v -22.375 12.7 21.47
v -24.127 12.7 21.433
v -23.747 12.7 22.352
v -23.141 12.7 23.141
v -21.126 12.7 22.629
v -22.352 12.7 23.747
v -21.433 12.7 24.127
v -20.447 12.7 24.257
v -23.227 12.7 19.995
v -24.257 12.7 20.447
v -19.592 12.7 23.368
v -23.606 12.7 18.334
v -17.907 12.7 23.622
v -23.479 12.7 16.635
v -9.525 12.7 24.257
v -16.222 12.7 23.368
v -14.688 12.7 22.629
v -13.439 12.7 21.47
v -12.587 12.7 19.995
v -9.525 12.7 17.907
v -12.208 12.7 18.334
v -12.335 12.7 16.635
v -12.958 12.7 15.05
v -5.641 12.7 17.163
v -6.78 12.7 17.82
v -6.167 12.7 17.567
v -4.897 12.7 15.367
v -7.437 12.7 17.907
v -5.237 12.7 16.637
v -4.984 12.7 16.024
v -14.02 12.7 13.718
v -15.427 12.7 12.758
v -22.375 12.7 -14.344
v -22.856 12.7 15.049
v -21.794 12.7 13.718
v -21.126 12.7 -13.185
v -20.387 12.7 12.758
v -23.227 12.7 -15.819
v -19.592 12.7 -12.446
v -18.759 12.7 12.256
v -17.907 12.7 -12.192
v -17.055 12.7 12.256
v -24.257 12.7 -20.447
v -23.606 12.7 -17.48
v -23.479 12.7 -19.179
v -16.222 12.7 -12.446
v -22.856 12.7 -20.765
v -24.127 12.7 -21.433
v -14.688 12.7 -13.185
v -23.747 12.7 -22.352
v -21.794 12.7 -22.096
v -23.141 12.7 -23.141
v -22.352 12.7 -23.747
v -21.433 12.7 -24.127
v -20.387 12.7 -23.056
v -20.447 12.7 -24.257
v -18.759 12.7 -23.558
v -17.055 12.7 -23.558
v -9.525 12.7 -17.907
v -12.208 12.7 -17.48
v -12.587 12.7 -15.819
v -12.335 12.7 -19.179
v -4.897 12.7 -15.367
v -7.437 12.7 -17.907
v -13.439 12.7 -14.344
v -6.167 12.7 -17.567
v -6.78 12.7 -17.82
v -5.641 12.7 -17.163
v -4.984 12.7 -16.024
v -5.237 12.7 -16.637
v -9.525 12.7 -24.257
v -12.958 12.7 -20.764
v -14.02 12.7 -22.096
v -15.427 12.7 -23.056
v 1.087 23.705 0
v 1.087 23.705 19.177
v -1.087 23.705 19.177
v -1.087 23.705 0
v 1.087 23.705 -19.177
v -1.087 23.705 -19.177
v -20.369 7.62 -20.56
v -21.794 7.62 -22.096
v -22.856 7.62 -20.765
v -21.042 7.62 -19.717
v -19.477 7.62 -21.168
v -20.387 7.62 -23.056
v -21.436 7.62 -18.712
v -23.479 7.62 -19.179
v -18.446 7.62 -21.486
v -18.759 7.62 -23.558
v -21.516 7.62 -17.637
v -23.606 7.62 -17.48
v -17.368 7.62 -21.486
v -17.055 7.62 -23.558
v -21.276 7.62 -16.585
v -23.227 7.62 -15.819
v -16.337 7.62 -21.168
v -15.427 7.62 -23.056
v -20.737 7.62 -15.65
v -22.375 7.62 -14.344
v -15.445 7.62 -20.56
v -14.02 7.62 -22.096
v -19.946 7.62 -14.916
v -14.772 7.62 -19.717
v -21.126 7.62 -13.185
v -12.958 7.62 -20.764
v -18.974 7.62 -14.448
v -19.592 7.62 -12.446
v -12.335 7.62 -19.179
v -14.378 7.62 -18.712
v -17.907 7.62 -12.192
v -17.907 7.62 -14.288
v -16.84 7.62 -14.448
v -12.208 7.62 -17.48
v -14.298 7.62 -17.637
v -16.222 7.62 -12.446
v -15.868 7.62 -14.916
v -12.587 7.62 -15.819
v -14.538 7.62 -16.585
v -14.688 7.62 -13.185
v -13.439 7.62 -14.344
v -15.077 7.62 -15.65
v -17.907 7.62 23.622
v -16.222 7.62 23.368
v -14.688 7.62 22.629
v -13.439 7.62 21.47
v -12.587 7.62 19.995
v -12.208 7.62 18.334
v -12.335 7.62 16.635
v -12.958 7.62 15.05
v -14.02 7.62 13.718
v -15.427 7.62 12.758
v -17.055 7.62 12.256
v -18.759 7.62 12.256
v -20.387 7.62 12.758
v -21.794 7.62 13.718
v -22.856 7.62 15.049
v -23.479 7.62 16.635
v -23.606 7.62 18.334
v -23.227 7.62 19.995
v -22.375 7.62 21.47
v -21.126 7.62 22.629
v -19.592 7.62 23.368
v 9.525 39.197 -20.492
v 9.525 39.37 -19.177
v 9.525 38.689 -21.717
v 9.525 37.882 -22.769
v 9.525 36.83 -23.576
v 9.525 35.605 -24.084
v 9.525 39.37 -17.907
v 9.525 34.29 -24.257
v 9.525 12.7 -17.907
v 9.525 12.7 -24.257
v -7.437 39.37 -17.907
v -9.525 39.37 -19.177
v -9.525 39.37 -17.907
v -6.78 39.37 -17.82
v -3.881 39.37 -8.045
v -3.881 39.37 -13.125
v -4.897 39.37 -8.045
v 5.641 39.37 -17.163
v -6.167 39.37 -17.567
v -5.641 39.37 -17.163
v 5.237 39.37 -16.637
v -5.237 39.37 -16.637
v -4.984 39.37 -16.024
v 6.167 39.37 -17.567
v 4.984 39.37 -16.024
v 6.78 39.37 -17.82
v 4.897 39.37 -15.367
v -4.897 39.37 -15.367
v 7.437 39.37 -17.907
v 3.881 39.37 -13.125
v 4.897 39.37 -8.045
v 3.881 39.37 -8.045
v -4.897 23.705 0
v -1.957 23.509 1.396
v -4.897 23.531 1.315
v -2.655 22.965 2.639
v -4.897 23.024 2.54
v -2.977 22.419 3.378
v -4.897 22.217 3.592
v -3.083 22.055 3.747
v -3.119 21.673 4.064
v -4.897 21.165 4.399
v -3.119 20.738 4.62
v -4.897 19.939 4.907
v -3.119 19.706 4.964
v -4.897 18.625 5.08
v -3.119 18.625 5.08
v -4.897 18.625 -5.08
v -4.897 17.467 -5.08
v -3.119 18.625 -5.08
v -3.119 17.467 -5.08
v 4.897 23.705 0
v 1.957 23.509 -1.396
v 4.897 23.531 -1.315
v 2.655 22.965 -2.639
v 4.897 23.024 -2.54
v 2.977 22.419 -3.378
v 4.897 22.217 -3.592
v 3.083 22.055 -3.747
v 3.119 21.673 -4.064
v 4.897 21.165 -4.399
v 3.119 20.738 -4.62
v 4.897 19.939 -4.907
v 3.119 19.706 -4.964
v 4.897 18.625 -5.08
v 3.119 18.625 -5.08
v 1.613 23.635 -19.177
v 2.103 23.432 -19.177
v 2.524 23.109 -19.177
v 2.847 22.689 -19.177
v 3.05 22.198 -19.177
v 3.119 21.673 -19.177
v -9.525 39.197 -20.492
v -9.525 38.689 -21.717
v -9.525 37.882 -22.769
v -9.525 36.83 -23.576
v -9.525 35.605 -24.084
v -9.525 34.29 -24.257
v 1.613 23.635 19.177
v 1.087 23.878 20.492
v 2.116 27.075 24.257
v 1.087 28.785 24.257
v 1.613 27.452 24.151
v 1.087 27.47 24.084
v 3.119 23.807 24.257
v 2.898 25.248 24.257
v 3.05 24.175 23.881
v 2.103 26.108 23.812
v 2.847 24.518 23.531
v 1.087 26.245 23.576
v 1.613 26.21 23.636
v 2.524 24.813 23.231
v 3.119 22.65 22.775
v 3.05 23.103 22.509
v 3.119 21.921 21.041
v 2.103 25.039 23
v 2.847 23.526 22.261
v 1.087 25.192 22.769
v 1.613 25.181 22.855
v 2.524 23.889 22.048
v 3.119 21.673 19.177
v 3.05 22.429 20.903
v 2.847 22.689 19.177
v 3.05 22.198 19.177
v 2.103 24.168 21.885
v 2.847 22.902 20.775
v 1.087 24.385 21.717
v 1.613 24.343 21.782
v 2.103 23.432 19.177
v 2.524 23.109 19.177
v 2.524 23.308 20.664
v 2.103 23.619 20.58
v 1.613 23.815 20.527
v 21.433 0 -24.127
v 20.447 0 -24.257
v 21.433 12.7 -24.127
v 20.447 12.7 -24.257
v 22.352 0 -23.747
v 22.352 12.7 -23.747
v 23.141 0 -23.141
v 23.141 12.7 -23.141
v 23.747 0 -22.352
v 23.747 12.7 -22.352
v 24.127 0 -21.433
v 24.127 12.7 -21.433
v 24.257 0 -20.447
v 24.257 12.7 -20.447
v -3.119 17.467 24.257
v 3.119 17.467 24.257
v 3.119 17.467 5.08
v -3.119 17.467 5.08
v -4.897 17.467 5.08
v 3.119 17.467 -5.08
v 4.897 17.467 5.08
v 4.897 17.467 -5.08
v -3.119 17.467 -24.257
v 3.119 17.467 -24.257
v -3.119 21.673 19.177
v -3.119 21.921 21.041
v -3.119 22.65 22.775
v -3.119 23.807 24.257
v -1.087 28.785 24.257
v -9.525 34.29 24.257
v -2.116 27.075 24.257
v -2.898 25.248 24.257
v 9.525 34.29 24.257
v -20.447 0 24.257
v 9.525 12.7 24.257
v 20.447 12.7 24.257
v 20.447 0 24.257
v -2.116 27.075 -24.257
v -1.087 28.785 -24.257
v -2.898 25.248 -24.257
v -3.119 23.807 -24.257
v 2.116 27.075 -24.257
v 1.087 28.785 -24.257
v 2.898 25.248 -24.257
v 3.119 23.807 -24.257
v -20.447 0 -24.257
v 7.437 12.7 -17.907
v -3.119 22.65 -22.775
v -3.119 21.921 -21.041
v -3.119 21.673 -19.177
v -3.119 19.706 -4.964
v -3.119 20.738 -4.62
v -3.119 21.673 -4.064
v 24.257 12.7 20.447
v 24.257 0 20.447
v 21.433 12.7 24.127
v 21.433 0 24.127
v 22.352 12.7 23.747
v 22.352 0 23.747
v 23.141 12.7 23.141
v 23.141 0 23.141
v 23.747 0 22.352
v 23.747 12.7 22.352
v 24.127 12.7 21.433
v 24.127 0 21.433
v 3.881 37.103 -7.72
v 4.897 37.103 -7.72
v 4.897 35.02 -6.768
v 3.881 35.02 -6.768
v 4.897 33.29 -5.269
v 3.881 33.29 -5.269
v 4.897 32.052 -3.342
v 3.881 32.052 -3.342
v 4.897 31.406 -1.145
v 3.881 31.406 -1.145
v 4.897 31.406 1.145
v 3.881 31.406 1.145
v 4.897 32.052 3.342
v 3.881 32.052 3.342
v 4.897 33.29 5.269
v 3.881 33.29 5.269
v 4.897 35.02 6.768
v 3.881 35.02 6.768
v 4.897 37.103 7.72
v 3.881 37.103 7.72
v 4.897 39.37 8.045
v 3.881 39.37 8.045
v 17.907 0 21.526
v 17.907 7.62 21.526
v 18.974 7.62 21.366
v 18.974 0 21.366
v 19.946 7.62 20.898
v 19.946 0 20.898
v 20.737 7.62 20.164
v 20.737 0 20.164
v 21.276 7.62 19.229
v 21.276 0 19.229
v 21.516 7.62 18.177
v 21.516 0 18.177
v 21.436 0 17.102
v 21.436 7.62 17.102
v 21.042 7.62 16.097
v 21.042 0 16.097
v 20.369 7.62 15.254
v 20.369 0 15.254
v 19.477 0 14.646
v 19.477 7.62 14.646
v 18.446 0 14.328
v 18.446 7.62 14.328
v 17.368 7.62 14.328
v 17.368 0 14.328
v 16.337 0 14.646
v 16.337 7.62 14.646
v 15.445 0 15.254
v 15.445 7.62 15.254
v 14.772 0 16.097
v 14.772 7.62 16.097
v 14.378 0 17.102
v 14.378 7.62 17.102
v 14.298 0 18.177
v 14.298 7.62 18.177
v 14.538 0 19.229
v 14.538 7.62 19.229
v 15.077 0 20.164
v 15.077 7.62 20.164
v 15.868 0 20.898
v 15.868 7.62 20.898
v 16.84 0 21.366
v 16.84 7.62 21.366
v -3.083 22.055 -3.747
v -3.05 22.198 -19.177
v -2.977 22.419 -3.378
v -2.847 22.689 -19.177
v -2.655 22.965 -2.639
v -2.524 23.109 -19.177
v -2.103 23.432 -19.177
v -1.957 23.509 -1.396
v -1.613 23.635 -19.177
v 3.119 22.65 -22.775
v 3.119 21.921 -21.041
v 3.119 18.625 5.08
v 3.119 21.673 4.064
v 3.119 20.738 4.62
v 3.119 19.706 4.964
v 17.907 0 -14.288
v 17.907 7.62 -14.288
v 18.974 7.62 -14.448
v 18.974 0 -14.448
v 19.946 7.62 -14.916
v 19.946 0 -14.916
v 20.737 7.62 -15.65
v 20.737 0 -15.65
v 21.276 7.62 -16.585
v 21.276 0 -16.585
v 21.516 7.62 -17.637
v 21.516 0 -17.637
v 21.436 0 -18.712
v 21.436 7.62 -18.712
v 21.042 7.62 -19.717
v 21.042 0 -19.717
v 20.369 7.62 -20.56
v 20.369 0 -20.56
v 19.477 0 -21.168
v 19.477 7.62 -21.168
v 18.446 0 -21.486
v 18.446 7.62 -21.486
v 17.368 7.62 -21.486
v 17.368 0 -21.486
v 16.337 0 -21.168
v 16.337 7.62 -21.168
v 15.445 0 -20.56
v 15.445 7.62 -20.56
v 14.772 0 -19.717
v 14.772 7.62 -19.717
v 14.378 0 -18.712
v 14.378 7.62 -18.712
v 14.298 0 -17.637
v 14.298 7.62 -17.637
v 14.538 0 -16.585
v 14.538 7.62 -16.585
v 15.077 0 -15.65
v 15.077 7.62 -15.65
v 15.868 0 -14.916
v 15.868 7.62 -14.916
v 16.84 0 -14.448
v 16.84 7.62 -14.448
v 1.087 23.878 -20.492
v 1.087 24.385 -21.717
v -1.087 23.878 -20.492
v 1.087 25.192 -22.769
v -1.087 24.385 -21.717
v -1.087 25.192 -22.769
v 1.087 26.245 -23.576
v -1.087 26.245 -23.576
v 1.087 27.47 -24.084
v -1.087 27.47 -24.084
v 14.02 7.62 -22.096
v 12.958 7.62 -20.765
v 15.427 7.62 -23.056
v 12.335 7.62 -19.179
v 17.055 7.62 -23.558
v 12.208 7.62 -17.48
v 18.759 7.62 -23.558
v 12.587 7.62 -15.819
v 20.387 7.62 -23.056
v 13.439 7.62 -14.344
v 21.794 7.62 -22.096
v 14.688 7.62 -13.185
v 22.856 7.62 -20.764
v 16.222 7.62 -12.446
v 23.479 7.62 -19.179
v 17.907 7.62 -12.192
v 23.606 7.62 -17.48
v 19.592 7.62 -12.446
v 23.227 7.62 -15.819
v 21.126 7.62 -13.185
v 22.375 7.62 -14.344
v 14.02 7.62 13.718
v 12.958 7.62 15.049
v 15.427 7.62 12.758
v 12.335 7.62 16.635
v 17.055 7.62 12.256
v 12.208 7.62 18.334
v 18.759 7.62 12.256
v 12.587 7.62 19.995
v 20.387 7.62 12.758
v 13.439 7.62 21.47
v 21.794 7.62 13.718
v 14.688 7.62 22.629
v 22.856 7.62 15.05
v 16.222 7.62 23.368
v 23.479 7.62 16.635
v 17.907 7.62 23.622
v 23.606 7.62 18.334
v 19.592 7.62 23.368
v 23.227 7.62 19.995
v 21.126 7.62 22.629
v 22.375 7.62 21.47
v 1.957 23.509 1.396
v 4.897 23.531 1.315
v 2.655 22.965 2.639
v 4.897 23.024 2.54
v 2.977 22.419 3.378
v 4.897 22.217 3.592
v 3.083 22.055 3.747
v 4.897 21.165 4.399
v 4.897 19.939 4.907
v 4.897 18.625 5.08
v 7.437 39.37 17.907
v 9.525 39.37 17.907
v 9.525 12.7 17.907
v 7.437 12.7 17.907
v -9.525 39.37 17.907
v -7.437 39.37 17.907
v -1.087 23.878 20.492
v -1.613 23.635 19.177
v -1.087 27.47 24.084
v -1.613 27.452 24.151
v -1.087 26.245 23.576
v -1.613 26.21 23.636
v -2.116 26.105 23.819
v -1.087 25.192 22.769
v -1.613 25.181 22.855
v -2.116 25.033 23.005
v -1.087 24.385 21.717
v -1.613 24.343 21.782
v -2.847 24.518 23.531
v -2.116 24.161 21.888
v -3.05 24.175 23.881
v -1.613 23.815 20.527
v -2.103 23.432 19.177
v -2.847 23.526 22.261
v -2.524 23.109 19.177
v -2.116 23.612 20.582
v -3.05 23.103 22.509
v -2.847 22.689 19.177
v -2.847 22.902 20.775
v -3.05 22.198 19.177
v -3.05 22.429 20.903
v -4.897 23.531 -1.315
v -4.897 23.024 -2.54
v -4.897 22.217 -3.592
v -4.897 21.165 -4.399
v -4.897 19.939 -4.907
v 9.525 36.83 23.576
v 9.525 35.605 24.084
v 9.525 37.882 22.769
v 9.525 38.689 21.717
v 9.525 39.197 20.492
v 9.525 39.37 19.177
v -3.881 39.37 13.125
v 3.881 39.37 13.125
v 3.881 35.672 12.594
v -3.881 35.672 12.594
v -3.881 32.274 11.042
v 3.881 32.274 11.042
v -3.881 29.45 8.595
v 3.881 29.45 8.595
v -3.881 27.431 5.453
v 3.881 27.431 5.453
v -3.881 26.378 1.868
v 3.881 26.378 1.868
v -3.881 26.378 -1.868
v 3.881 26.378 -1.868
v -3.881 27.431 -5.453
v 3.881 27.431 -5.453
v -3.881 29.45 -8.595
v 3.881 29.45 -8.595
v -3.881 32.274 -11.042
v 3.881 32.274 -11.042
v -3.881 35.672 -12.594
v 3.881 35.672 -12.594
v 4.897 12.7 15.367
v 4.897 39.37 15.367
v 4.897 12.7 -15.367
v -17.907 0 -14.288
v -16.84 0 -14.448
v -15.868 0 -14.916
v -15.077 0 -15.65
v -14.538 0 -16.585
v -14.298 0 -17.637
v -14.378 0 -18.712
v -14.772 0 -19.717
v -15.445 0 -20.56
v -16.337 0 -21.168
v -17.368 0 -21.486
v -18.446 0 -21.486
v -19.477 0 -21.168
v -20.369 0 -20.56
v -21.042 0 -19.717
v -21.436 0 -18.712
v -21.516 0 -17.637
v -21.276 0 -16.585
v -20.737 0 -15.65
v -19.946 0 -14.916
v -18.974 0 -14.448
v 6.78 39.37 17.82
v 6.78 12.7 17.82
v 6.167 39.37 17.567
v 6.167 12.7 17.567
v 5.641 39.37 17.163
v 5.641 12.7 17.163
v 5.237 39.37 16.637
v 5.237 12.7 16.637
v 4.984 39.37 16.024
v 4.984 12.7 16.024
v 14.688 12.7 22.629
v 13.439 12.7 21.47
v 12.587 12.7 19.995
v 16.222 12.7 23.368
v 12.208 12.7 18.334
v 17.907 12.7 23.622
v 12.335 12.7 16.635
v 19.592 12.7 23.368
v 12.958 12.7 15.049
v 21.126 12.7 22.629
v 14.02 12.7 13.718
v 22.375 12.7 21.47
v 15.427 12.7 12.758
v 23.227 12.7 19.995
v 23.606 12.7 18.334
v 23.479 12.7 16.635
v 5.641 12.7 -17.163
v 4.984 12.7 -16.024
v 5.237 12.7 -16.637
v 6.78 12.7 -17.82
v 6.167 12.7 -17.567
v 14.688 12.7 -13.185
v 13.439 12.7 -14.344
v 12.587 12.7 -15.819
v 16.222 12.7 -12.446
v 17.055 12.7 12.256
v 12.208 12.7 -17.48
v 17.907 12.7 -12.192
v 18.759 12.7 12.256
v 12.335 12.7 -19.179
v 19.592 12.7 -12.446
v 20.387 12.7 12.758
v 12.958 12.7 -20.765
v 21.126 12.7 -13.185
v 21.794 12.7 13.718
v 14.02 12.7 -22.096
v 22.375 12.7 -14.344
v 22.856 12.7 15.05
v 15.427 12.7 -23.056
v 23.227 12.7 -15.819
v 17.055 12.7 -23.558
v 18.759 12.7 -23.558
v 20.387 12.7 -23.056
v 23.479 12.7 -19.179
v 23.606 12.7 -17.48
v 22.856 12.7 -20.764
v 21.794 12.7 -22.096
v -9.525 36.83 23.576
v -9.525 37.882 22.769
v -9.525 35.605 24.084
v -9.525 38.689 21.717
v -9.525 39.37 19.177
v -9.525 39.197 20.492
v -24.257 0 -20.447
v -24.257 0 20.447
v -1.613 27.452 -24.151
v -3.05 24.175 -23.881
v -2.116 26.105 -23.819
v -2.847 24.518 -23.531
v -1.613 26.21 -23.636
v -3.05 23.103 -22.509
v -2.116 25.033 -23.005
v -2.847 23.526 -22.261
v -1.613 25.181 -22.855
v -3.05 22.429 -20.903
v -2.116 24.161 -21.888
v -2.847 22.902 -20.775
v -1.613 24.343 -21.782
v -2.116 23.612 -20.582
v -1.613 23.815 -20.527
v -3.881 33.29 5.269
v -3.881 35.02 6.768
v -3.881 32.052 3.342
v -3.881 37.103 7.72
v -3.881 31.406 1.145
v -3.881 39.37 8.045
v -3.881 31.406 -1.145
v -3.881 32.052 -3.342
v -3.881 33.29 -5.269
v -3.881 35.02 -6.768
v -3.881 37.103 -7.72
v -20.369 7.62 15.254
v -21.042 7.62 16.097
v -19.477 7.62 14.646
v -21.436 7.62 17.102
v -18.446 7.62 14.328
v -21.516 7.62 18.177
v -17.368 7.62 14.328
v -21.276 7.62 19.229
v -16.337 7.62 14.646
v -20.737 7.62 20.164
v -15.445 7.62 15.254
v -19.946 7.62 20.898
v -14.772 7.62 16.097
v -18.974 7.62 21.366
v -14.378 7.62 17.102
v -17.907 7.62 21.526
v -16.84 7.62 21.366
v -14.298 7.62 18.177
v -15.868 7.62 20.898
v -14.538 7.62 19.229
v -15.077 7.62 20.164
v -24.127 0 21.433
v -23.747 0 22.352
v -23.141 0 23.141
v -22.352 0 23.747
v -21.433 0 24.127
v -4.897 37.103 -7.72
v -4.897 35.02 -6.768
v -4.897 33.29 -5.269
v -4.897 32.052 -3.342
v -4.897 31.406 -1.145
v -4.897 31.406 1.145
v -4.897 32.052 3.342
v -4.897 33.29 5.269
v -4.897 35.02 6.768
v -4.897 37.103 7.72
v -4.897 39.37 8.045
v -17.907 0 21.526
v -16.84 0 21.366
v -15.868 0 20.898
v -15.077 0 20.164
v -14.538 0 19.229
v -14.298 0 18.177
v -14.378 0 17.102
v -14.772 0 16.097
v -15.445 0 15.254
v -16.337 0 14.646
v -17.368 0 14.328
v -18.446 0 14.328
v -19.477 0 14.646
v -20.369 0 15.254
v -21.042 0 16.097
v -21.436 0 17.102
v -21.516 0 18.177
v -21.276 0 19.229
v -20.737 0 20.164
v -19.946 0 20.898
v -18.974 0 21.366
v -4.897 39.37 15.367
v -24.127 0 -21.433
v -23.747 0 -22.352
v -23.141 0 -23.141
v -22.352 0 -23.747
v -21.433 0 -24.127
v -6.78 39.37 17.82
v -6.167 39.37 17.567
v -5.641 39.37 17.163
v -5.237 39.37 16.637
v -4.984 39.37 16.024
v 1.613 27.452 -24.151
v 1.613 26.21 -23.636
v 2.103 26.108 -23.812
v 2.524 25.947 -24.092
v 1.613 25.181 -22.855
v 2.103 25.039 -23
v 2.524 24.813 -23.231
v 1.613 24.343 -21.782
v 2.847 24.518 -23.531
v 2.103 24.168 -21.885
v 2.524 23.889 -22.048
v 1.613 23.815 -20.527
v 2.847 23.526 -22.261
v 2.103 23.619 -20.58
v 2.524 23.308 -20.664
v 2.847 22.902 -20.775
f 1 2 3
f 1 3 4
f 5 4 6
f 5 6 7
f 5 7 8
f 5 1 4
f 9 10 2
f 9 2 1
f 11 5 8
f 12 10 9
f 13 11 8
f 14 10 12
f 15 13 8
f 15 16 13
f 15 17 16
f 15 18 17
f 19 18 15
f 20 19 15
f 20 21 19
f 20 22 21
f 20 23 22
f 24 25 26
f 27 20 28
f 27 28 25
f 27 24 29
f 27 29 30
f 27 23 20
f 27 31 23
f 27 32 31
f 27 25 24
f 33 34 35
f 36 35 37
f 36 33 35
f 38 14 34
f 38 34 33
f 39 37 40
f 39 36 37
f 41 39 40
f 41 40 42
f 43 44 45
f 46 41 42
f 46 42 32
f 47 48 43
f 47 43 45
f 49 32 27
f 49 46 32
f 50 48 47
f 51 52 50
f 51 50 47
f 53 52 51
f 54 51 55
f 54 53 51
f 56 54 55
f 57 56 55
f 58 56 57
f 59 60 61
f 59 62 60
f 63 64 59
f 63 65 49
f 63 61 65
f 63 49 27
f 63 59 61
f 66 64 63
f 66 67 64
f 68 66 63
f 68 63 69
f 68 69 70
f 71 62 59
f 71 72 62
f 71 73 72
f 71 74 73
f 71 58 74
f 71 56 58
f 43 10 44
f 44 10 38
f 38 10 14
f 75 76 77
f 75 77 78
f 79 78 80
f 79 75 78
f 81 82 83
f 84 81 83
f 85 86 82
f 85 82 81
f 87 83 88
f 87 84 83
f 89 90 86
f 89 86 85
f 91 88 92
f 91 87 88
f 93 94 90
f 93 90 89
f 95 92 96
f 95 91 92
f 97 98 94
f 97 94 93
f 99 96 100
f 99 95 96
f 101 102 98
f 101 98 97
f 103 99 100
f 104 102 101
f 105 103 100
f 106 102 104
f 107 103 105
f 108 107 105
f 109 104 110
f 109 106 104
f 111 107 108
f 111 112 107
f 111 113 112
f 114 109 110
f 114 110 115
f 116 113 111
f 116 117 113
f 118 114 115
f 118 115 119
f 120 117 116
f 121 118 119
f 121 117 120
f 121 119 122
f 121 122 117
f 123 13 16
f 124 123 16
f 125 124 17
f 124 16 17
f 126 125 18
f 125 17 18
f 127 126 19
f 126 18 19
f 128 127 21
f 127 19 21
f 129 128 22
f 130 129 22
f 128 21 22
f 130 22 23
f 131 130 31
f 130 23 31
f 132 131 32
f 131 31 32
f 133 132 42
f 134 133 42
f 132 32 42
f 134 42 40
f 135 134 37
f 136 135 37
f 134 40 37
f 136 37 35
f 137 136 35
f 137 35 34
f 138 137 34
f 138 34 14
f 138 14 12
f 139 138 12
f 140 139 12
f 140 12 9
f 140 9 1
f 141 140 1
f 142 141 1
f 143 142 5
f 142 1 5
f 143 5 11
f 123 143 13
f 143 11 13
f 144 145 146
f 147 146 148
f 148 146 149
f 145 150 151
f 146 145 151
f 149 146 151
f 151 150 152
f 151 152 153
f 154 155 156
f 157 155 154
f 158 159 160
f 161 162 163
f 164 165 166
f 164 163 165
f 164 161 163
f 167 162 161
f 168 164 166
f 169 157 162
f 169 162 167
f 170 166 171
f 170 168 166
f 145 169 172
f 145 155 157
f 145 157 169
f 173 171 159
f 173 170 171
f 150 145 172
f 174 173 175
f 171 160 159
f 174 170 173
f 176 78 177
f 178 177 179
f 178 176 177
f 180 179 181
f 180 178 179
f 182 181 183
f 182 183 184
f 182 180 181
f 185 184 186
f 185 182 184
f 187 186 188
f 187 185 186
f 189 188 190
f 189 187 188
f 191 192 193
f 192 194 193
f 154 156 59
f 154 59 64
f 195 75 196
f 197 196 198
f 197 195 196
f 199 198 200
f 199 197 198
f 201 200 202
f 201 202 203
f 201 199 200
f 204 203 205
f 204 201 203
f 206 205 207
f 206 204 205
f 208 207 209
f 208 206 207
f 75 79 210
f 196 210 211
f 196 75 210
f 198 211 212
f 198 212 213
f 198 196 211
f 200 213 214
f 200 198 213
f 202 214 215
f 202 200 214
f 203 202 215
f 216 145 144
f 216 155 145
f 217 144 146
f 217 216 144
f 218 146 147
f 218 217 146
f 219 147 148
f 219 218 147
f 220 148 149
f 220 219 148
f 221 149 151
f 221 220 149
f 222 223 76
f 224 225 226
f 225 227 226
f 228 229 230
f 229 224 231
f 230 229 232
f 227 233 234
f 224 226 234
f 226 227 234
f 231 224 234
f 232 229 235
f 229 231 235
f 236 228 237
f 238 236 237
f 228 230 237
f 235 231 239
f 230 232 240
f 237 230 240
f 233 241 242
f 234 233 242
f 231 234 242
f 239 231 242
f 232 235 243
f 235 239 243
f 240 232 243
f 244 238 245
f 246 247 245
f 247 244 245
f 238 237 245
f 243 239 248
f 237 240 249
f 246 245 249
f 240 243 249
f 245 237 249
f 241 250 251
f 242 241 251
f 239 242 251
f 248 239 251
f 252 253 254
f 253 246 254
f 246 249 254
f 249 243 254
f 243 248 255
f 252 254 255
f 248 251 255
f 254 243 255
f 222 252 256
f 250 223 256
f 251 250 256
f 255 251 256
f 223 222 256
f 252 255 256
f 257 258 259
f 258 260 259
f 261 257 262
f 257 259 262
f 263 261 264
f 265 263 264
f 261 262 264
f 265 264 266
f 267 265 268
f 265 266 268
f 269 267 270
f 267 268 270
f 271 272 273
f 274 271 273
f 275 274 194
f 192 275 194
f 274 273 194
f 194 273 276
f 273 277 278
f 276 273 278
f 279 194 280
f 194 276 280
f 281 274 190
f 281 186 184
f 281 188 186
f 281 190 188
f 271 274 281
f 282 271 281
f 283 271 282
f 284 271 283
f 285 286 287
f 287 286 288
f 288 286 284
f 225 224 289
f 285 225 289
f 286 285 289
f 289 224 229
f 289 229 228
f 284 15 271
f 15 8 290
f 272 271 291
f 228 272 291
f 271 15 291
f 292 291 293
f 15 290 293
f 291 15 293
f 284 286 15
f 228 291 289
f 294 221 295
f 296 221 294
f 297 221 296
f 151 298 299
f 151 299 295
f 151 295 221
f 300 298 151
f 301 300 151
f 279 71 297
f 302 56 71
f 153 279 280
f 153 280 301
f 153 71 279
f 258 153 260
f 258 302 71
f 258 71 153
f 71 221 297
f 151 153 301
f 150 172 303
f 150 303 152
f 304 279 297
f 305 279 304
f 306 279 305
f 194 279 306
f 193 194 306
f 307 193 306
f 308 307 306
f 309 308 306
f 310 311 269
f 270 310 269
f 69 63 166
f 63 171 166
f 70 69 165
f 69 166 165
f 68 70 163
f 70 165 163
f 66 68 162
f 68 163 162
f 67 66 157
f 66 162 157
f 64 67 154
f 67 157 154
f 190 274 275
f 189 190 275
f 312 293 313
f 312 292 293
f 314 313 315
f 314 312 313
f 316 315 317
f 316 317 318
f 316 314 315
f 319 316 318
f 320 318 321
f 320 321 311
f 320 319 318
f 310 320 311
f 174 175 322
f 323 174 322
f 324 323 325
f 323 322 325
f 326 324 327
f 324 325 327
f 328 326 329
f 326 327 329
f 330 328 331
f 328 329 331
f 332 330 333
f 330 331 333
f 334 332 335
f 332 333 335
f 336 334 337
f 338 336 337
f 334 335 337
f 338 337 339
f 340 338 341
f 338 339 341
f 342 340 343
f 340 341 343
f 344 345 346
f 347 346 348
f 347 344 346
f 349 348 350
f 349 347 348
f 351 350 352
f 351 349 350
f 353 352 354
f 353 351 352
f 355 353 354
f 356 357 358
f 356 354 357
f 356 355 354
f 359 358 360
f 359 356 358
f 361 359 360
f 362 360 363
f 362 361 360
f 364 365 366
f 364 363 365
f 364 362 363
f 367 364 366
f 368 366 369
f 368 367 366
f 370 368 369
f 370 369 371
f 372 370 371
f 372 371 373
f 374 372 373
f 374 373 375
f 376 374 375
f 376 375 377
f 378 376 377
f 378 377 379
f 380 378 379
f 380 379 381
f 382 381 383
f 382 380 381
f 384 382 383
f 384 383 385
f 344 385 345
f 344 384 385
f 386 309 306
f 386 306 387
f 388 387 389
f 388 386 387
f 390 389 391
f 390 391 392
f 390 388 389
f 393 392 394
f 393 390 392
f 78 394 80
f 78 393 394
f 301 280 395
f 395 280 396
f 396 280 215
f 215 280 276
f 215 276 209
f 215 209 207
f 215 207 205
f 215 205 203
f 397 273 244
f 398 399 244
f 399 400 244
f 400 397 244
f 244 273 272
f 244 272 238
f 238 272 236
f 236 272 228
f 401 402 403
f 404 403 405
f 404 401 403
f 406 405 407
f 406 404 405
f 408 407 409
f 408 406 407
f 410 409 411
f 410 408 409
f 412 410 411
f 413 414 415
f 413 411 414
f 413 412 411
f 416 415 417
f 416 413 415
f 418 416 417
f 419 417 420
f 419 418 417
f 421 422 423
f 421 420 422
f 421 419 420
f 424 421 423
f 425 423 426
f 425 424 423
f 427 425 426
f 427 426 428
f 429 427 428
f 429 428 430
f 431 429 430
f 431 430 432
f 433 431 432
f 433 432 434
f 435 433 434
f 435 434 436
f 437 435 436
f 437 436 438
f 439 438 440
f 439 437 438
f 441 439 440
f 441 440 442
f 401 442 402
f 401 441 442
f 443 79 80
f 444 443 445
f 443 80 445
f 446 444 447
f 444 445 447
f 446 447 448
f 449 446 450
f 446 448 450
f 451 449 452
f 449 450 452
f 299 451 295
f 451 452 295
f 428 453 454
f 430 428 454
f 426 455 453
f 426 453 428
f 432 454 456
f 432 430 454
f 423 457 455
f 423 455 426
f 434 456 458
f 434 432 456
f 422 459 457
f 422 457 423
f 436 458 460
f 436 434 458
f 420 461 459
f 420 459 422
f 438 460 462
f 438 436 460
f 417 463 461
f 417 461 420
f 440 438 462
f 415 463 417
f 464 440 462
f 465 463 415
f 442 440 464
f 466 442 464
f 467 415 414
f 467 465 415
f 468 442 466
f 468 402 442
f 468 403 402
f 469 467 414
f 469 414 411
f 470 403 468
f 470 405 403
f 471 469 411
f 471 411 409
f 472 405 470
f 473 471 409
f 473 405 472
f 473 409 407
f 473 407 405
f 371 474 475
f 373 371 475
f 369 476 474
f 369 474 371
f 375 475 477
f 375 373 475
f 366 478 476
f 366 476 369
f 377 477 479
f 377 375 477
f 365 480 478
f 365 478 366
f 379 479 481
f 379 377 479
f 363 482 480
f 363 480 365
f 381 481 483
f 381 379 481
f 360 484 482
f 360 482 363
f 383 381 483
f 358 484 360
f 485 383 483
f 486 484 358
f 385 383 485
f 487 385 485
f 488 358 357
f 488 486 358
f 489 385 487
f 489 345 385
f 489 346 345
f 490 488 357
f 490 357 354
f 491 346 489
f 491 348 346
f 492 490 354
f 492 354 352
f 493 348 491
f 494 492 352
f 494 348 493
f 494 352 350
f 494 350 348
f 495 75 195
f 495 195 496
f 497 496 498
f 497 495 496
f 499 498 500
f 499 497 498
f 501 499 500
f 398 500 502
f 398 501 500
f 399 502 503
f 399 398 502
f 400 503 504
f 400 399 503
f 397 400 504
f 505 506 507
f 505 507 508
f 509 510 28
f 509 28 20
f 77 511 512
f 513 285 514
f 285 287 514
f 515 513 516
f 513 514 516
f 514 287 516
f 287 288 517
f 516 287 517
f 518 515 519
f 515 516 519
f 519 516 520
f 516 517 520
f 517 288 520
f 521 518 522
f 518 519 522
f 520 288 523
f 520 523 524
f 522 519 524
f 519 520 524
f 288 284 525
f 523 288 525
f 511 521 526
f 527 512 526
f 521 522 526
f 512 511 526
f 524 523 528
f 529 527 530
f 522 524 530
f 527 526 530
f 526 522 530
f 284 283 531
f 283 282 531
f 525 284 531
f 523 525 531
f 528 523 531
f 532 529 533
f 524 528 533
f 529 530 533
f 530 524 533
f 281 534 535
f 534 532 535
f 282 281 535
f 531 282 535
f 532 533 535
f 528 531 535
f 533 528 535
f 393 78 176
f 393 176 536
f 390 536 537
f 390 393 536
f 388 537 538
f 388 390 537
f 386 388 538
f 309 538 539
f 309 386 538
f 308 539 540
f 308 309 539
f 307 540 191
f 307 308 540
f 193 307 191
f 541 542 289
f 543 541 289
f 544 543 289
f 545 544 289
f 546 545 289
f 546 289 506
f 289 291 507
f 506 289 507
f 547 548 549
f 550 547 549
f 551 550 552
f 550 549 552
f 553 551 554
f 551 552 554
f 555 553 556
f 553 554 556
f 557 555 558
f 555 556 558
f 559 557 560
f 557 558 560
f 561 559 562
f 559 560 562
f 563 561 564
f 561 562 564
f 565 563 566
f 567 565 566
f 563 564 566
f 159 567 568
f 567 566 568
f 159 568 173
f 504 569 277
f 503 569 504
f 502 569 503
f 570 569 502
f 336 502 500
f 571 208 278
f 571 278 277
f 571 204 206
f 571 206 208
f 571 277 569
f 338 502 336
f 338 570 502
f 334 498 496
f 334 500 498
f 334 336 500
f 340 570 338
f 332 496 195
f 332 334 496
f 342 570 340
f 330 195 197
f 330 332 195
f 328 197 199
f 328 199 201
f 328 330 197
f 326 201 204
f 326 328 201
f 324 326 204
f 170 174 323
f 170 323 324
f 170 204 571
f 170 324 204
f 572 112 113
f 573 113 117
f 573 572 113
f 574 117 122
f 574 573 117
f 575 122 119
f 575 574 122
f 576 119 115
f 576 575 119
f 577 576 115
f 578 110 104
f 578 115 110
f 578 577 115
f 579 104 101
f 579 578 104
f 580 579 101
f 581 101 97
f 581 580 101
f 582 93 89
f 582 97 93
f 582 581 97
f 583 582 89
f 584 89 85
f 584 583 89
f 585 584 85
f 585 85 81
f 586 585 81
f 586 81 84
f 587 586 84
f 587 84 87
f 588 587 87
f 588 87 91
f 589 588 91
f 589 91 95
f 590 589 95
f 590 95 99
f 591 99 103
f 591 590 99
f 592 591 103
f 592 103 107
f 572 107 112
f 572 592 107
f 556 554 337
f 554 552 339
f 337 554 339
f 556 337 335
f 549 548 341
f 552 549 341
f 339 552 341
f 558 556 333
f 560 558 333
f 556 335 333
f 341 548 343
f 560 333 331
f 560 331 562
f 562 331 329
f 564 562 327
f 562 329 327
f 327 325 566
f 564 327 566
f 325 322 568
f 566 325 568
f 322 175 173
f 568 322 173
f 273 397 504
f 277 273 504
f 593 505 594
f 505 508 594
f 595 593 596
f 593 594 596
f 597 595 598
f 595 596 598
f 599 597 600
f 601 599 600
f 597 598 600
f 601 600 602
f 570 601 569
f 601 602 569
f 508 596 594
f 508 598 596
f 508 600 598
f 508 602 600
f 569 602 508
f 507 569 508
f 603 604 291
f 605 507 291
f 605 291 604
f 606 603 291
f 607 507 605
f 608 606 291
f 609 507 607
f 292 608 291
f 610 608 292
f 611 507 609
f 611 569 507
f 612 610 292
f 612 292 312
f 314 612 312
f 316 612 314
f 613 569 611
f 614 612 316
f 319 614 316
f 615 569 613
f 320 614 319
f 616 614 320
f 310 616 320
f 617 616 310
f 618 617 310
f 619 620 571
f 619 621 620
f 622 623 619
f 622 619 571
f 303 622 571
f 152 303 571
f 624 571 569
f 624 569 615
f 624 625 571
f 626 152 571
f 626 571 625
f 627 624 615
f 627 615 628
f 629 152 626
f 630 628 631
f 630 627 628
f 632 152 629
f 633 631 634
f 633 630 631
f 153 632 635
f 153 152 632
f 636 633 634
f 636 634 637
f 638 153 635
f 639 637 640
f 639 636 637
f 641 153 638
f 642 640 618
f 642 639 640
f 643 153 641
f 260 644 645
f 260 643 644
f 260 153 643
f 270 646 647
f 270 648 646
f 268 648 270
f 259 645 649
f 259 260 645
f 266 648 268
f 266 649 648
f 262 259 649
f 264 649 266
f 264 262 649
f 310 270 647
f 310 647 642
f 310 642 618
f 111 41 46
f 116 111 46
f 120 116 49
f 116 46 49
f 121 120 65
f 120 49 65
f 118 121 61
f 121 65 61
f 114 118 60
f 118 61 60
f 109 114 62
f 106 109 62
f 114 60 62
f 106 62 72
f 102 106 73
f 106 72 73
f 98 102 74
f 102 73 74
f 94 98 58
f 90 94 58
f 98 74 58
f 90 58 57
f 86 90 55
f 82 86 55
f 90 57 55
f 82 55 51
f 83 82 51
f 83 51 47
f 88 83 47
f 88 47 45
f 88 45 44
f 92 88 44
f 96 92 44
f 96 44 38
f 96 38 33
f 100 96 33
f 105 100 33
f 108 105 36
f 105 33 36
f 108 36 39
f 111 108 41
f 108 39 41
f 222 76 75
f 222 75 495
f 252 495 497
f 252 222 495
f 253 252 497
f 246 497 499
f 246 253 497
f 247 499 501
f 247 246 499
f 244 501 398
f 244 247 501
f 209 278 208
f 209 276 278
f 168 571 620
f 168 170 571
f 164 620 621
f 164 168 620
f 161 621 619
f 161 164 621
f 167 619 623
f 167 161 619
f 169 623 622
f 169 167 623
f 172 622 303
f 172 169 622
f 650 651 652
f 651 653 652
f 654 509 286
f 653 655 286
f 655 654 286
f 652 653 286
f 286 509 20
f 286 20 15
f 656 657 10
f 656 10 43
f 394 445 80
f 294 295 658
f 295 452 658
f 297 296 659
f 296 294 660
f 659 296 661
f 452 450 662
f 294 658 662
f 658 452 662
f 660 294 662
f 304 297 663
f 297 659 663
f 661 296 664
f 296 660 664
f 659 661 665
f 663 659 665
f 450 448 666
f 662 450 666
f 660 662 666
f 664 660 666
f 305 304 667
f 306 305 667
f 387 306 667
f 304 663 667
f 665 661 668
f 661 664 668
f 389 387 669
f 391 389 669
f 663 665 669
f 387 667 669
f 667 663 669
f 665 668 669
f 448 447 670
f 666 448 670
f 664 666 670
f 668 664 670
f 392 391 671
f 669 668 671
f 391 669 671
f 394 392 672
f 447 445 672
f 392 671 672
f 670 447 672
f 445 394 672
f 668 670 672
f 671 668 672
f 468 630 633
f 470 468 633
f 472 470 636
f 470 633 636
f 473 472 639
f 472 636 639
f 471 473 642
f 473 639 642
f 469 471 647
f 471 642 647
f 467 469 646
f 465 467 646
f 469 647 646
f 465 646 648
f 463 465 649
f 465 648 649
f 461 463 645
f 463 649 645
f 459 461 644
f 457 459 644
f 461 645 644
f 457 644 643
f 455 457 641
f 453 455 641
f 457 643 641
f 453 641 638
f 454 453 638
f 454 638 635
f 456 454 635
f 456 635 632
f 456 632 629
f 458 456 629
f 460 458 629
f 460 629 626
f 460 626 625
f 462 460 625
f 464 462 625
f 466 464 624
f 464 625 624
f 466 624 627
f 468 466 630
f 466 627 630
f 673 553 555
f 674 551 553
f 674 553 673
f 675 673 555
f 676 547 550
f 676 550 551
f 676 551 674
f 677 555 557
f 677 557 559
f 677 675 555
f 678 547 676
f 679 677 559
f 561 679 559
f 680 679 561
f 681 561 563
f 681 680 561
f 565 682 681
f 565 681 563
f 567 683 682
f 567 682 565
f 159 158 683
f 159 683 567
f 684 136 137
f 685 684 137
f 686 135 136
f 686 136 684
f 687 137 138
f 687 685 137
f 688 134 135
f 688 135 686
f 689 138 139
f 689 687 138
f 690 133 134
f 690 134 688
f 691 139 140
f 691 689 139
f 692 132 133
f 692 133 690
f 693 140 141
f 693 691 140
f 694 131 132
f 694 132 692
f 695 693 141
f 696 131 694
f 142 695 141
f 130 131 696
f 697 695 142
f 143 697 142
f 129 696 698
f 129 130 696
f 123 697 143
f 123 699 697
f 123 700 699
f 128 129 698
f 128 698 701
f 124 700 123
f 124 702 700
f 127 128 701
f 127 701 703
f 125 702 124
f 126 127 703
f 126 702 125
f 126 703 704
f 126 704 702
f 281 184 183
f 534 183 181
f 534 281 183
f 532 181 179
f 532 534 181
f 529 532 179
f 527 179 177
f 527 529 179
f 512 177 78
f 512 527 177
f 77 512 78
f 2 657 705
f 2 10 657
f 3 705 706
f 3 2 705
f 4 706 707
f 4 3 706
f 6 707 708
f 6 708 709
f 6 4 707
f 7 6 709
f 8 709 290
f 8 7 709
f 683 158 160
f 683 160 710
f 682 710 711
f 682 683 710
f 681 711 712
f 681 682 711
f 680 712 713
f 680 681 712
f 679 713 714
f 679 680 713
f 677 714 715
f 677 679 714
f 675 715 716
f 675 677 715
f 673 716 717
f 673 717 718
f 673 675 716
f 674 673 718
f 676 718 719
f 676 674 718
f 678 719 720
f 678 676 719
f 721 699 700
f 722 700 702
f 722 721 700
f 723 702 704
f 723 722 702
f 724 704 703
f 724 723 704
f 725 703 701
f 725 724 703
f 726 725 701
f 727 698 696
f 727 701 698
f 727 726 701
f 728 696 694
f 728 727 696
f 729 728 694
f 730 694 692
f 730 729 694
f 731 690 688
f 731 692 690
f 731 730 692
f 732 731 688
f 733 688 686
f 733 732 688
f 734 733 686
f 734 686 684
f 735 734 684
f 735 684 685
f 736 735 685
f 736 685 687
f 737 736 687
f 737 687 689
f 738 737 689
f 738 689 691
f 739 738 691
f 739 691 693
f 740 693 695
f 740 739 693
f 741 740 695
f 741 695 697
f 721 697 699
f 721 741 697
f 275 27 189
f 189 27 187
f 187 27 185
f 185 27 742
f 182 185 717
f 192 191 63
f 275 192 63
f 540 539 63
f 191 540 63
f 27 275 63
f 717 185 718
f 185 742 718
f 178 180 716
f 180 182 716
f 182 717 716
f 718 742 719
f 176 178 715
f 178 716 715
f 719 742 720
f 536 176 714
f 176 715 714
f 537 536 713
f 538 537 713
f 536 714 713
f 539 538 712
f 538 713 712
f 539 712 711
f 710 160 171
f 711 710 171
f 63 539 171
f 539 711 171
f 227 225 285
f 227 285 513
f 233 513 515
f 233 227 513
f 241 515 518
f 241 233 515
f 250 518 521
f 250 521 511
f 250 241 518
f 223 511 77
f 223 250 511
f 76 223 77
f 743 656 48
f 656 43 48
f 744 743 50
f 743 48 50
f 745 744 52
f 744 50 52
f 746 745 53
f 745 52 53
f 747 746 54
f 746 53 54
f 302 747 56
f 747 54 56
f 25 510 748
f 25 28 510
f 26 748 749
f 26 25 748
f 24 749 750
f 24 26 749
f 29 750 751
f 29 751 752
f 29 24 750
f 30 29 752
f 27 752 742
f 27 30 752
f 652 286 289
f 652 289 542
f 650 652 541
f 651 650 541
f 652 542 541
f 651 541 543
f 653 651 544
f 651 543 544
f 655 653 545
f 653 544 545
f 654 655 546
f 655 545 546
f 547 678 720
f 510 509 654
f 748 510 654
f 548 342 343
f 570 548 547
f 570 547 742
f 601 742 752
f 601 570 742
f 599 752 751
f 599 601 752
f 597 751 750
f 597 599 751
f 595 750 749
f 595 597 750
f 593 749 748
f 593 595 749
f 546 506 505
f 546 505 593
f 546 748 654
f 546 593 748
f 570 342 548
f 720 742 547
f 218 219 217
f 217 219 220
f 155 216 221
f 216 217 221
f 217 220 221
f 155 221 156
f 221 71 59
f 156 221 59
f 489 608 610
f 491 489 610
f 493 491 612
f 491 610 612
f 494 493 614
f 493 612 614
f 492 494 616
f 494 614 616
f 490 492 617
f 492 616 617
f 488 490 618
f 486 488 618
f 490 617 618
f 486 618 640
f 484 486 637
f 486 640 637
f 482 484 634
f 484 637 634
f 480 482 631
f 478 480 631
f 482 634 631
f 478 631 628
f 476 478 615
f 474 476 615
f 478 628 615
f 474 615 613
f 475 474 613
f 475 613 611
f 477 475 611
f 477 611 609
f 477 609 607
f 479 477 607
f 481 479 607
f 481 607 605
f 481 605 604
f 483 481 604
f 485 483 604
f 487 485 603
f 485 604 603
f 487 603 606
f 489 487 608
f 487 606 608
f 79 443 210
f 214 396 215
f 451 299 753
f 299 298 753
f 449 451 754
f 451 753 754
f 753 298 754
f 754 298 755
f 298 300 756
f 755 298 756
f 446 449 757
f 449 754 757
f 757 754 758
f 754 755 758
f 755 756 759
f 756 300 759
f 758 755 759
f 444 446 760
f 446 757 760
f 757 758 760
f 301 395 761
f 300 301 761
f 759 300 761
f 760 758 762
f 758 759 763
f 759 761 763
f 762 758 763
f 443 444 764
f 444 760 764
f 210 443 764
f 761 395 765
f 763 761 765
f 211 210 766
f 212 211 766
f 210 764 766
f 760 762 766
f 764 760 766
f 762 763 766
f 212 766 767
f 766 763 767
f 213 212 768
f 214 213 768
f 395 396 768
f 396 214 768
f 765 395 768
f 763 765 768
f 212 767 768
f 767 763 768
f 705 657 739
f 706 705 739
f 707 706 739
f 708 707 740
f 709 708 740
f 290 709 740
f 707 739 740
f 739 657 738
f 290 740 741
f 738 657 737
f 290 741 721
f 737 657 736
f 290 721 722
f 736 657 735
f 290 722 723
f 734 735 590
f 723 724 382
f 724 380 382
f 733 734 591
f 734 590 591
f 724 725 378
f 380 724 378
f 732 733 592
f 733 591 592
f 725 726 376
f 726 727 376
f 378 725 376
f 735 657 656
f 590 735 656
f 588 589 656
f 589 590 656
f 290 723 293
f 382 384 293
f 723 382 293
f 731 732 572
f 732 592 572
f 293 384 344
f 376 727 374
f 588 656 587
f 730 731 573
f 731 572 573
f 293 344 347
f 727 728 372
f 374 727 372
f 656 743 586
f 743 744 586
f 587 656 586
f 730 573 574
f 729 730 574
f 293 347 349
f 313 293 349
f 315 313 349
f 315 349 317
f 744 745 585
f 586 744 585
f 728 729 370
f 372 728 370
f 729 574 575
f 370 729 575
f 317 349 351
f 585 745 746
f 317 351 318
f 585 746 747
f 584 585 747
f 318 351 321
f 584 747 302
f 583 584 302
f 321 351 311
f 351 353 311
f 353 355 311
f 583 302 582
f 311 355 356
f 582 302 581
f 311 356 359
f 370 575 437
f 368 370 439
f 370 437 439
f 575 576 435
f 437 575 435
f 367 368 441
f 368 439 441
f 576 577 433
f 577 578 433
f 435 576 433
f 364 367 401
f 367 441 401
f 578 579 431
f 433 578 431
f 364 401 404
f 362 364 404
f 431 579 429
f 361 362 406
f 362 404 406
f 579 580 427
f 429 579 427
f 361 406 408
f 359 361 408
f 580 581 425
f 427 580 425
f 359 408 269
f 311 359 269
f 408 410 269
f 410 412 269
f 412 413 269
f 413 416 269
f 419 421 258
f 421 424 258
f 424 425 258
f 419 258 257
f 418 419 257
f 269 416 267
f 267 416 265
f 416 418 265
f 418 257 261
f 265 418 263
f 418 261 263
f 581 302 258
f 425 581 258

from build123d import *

# Parameters (mm, degrees)
SKETCH1_W           = 48.514
SKETCH1_H           = 48.514
SKETCH1_R           = 3.6195
BOSS_EXTRUDE1_DEPTH = 12.7
FILLET1_R           = 3.81
SKETCH4_R           = 5.715
CUT_EXTRUDE2_DEPTH  = 5.08
BOSS_EXTRUDE3_DEPTH = 26.67
SKETCH8_R           = 13.12545
CUT_EXTRUDE4_DEPTH  = 7.762
SKETCH11_W          = 6.238
SKETCH11_H          = 6.238
CUT_EXTRUDE7_DEPTH  = 68.022437624
SKETCH13_W          = 5.08
SKETCH13_H          = 6.238
CUT_EXTRUDE8_DEPTH  = 55.130822948
SKETCH14_W          = 10.16
SKETCH14_H          = 6.238
BOSS_EXTRUDE4_DEPTH = 1.016
FILLET3_R           = 5.08
FILLET2_R           = 2.54
FILLET4_R           = 2.032
FILLET6_R           = 5.08


# Some blends are built 0.0001 mm under size
with BuildPart() as part:
    # Sketch1 → Boss-Extrude1 (new body)
    with BuildSketch(Plane(origin=(0, 0, 0), x_dir=(1, 0, 0), z_dir=(0, 1, 0))):
        Rectangle(SKETCH1_W, SKETCH1_H)
        with Locations(Location((-17.907, 17.907, 0), (0, 0, 270))):
            Circle(SKETCH1_R, mode=Mode.SUBTRACT)
        with Locations(Location((17.907, 17.907, 0), (0, 0, 270))):
            Circle(SKETCH1_R, mode=Mode.SUBTRACT)
        with Locations(Location((17.907, -17.907, 0), (0, 0, 270))):
            Circle(SKETCH1_R, mode=Mode.SUBTRACT)
        with Locations(Location((-17.907, -17.907, 0), (0, 0, 270))):
            Circle(SKETCH1_R, mode=Mode.SUBTRACT)
    extrude(amount=BOSS_EXTRUDE1_DEPTH)

    # Fillet1
    fillet1_edges = [part.edges().sort_by_distance(p)[0] for p in [
        (24.257, 6.35, 24.257),
        (-24.257, 6.35, 24.257),
        (-24.257, 6.35, -24.257),
        (24.257, 6.35, -24.257),
    ]]
    fillet(fillet1_edges, radius=FILLET1_R)

    # Sketch4 → Cut-Extrude2 (cut)
    with BuildSketch(Plane(origin=(0, 12.7, 0), x_dir=(1, 0, 0), z_dir=(0, 1, 0))):
        with Locations(Location((-17.907, 17.907, 0), (0, 0, 270))):
            Circle(SKETCH4_R)
        with Locations(Location((17.907, -17.907, 0), (0, 0, 270))):
            Circle(SKETCH4_R)
        with Locations(Location((17.907, 17.907, 0), (0, 0, 270))):
            Circle(SKETCH4_R)
        with Locations(Location((-17.907, -17.907, 0), (0, 0, 270))):
            Circle(SKETCH4_R)
    extrude(amount=-CUT_EXTRUDE2_DEPTH, mode=Mode.SUBTRACT)

    # Sketch6 → Boss-Extrude3 (add)
    with BuildSketch(Plane(origin=(0, 12.7, 0), x_dir=(1, 0, 0), z_dir=(0, 1, 0))):
        Polygon((-3.881, 17.907), (-3.881, -17.907), (-9.525, -17.907), (-9.525, -24.257), (9.525, -24.257), (9.525, -17.907), (3.881, -17.907), (3.881, 17.907), (9.525, 17.907), (9.525, 24.257), (-9.525, 24.257), (-9.525, 17.907), align=None)
    extrude(amount=BOSS_EXTRUDE3_DEPTH)

    # Sketch8 → Cut-Extrude4 (cut)
    with BuildSketch(Plane(origin=(3.881, 0, 0), x_dir=(0, 0, -1), z_dir=(1, 0, 0))):
        with Locations((0, 39.37)):
            Circle(SKETCH8_R)
    extrude(amount=-CUT_EXTRUDE4_DEPTH, mode=Mode.SUBTRACT)

    # Sketch11 → Cut-Extrude7 (cut, through all)
    with BuildSketch(Plane.XY.offset(24.257)):
        with Locations((0, 20.58555)):
            Rectangle(SKETCH11_W, SKETCH11_H)
    extrude(amount=-CUT_EXTRUDE7_DEPTH, mode=Mode.SUBTRACT)

    # Sketch13 → Cut-Extrude8 (cut, through all)
    with BuildSketch(Plane(origin=(3.881, 0, 0), x_dir=(0, 0, -1), z_dir=(1, 0, 0))):
        with Locations((-2.54, 20.58555)):
            Rectangle(SKETCH13_W, SKETCH13_H)
        with Locations((2.54, 20.58555)):
            Rectangle(SKETCH13_W, SKETCH13_H)
    extrude(amount=-CUT_EXTRUDE8_DEPTH, mode=Mode.SUBTRACT)

    # Sketch14 → Boss-Extrude4 (add)
    with BuildSketch(Plane(origin=(3.881, 0, 0), x_dir=(0, 0, -1), z_dir=(1, 0, 0))):
        with BuildLine():
            Line((17.907, 39.37), (8.04545, 39.37))
            ThreePointArc((8.04545, 39.37), (0, 31.32455), (-8.04545, 39.37))
            Line((-8.04545, 39.37), (-17.907, 39.37))
            Line((-17.907, 39.37), (-17.907, 12.7))
            Line((-17.907, 12.7), (17.907, 12.7))
            Line((17.907, 12.7), (17.907, 39.37))
        make_face()
        with Locations((0, 20.58555)):
            Rectangle(SKETCH14_W, SKETCH14_H, mode=Mode.SUBTRACT)
    boss_extrude4 = extrude(amount=BOSS_EXTRUDE4_DEPTH)

    # Mirror1: Boss-Extrude4 across plane
    add(boss_extrude4.mirror(Plane(origin=(0, 0, 0), x_dir=(0, 0, 1), z_dir=(1, 0, 0))))

    # Fillet3
    fillet3_edges = [part.edges().sort_by_distance(p)[0] for p in [
        (0, 23.70455, -24.257),
        (0, 23.70455, 24.257),
        (0, 39.37, 24.257),
        (0, 39.37, -24.257),
    ]]
    fillet(fillet3_edges, radius=FILLET3_R)

    # Fillet2
    fillet2_edges = [part.edges().sort_by_distance(p)[0] for p in [
        (4.897, 26.035, -17.907),
        (4.897, 26.035, 17.907),
        (-4.897, 26.035, -17.907),
        (-4.897, 26.035, 17.907),
    ]]
    fillet(fillet2_edges, radius=FILLET2_R)

    # Fillet4
    # the kernel refuses this fillet: 2.032 mm, written as the material it adds along each edge
    with BuildSketch(Plane(origin=(3.119, 23.70455, 19.177), x_dir=(-1, 0, 0), z_dir=(0, 0, -1)), Plane(origin=(3.119, 23.70455, -5.08), x_dir=(-1, 0, 0), z_dir=(0, 0, -1))) as fillet4_piece_1:
        with BuildLine():
            CenterArc((FILLET4_R, -FILLET4_R), FILLET4_R, 90, 90)
            Line((0, -FILLET4_R), (0, 0))
            Line((0, 0), (FILLET4_R, 0))
        make_face()
    extrude(amount=14.097)
    with BuildSketch(Plane(origin=(-3.119, 23.70455, 19.177), x_dir=(1, 0, 0), z_dir=(0, 0, -1)), Plane(origin=(-3.119, 23.70455, -5.08), x_dir=(1, 0, 0), z_dir=(0, 0, -1))) as fillet4_piece_2:
        with BuildLine():
            CenterArc((FILLET4_R, FILLET4_R), FILLET4_R, 180, 90)
            Line((0, FILLET4_R), (0, 0))
            Line((0, 0), (FILLET4_R, 0))
        make_face()
    extrude(amount=14.097)
    with BuildSketch(Plane(origin=(-3.119, 28.78455, -19.177), x_dir=(0, 0.8416879607506225, -0.5399642365263265), z_dir=(0, 0.5399642365263265, 0.8416879607506225))) as fillet4_piece_3_section:
        with BuildLine():
            CenterArc((5.08 + FILLET4_R, -FILLET4_R), FILLET4_R, 90, 90)
            Line((5.08, -FILLET4_R), (5.08, 0))
            Line((5.08, 0), (5.08 + FILLET4_R, 0))
        make_face()
    fillet4_piece_3 = revolve(axis=Axis((-3.119, 28.78455, -19.177), (-1, 0, 0)), revolution_arc=147.318795695, mode=Mode.PRIVATE)
    fillet4_piece_3 = split(fillet4_piece_3, bisect_by=Plane(origin=(-3.119, 28.78455, -24.257), z_dir=(0, 0, 1)), keep=Keep.TOP, mode=Mode.PRIVATE)
    add(fillet4_piece_3)
    with BuildSketch(Plane(origin=(3.119, 28.78455, -19.177), x_dir=(0, 0.8416879607506221, -0.5399642365263271), z_dir=(0, 0.5399642365263271, 0.8416879607506221))) as fillet4_piece_4_section:
        with BuildLine():
            CenterArc((5.08 + FILLET4_R, FILLET4_R), FILLET4_R, 180, 90)
            Line((5.08 + FILLET4_R, 0), (5.08, 0))
            Line((5.08, 0), (5.08, FILLET4_R))
        make_face()
    fillet4_piece_4 = revolve(axis=Axis((3.119, 28.78455, -19.177), (-1, 0, 0)), revolution_arc=147.318795695, mode=Mode.PRIVATE)
    fillet4_piece_4 = split(fillet4_piece_4, bisect_by=Plane(origin=(3.119, 28.78455, -24.257), z_dir=(0, 0, 1)), keep=Keep.TOP, mode=Mode.PRIVATE)
    add(fillet4_piece_4)
    with BuildSketch(Plane(origin=(-3.119, 28.78455, 19.177), x_dir=(0, 0.8416879607506225, 0.5399642365263265), z_dir=(0, 0.5399642365263265, -0.8416879607506225))) as fillet4_piece_5_section:
        with BuildLine():
            CenterArc((5.08 + FILLET4_R, FILLET4_R), FILLET4_R, 180, 90)
            Line((5.08, FILLET4_R), (5.08, 0))
            Line((5.08, 0), (5.08 + FILLET4_R, 0))
        make_face()
    fillet4_piece_5 = revolve(axis=Axis((-3.119, 28.78455, 19.177), (1, 0, 0)), revolution_arc=147.318795695, mode=Mode.PRIVATE)
    fillet4_piece_5 = split(fillet4_piece_5, bisect_by=Plane(origin=(-3.119, 28.78455, 24.257), z_dir=(0, 0, -1)), keep=Keep.TOP, mode=Mode.PRIVATE)
    add(fillet4_piece_5)
    with BuildSketch(Plane(origin=(3.119, 28.78455, 19.177), x_dir=(0, 0.8416879607506221, 0.5399642365263271), z_dir=(0, 0.5399642365263271, -0.8416879607506221))) as fillet4_piece_6_section:
        with BuildLine():
            CenterArc((5.08 + FILLET4_R, -FILLET4_R), FILLET4_R, 90, 90)
            Line((5.08, -FILLET4_R), (5.08, 0))
            Line((5.08, 0), (5.08 + FILLET4_R, 0))
        make_face()
    fillet4_piece_6 = revolve(axis=Axis((3.119, 28.78455, 19.177), (1, 0, 0)), revolution_arc=147.318795695, mode=Mode.PRIVATE)
    fillet4_piece_6 = split(fillet4_piece_6, bisect_by=Plane(origin=(3.119, 28.78455, 24.257), z_dir=(0, 0, -1)), keep=Keep.TOP, mode=Mode.PRIVATE)
    add(fillet4_piece_6)

    # Fillet6
    fillet6_edges = [part.edges().sort_by_distance(p)[0] for p in [
        (-2.992, 23.70455, -5.08),
        (2.992, 23.70455, -5.08),
        (-2.992, 23.70455, 5.08),
        (2.992, 23.70455, 5.08),
    ]]
    fillet(fillet6_edges, radius=FILLET6_R - 0.0001)  # a hair under: the kernel refuses the full size


solid = part.part
